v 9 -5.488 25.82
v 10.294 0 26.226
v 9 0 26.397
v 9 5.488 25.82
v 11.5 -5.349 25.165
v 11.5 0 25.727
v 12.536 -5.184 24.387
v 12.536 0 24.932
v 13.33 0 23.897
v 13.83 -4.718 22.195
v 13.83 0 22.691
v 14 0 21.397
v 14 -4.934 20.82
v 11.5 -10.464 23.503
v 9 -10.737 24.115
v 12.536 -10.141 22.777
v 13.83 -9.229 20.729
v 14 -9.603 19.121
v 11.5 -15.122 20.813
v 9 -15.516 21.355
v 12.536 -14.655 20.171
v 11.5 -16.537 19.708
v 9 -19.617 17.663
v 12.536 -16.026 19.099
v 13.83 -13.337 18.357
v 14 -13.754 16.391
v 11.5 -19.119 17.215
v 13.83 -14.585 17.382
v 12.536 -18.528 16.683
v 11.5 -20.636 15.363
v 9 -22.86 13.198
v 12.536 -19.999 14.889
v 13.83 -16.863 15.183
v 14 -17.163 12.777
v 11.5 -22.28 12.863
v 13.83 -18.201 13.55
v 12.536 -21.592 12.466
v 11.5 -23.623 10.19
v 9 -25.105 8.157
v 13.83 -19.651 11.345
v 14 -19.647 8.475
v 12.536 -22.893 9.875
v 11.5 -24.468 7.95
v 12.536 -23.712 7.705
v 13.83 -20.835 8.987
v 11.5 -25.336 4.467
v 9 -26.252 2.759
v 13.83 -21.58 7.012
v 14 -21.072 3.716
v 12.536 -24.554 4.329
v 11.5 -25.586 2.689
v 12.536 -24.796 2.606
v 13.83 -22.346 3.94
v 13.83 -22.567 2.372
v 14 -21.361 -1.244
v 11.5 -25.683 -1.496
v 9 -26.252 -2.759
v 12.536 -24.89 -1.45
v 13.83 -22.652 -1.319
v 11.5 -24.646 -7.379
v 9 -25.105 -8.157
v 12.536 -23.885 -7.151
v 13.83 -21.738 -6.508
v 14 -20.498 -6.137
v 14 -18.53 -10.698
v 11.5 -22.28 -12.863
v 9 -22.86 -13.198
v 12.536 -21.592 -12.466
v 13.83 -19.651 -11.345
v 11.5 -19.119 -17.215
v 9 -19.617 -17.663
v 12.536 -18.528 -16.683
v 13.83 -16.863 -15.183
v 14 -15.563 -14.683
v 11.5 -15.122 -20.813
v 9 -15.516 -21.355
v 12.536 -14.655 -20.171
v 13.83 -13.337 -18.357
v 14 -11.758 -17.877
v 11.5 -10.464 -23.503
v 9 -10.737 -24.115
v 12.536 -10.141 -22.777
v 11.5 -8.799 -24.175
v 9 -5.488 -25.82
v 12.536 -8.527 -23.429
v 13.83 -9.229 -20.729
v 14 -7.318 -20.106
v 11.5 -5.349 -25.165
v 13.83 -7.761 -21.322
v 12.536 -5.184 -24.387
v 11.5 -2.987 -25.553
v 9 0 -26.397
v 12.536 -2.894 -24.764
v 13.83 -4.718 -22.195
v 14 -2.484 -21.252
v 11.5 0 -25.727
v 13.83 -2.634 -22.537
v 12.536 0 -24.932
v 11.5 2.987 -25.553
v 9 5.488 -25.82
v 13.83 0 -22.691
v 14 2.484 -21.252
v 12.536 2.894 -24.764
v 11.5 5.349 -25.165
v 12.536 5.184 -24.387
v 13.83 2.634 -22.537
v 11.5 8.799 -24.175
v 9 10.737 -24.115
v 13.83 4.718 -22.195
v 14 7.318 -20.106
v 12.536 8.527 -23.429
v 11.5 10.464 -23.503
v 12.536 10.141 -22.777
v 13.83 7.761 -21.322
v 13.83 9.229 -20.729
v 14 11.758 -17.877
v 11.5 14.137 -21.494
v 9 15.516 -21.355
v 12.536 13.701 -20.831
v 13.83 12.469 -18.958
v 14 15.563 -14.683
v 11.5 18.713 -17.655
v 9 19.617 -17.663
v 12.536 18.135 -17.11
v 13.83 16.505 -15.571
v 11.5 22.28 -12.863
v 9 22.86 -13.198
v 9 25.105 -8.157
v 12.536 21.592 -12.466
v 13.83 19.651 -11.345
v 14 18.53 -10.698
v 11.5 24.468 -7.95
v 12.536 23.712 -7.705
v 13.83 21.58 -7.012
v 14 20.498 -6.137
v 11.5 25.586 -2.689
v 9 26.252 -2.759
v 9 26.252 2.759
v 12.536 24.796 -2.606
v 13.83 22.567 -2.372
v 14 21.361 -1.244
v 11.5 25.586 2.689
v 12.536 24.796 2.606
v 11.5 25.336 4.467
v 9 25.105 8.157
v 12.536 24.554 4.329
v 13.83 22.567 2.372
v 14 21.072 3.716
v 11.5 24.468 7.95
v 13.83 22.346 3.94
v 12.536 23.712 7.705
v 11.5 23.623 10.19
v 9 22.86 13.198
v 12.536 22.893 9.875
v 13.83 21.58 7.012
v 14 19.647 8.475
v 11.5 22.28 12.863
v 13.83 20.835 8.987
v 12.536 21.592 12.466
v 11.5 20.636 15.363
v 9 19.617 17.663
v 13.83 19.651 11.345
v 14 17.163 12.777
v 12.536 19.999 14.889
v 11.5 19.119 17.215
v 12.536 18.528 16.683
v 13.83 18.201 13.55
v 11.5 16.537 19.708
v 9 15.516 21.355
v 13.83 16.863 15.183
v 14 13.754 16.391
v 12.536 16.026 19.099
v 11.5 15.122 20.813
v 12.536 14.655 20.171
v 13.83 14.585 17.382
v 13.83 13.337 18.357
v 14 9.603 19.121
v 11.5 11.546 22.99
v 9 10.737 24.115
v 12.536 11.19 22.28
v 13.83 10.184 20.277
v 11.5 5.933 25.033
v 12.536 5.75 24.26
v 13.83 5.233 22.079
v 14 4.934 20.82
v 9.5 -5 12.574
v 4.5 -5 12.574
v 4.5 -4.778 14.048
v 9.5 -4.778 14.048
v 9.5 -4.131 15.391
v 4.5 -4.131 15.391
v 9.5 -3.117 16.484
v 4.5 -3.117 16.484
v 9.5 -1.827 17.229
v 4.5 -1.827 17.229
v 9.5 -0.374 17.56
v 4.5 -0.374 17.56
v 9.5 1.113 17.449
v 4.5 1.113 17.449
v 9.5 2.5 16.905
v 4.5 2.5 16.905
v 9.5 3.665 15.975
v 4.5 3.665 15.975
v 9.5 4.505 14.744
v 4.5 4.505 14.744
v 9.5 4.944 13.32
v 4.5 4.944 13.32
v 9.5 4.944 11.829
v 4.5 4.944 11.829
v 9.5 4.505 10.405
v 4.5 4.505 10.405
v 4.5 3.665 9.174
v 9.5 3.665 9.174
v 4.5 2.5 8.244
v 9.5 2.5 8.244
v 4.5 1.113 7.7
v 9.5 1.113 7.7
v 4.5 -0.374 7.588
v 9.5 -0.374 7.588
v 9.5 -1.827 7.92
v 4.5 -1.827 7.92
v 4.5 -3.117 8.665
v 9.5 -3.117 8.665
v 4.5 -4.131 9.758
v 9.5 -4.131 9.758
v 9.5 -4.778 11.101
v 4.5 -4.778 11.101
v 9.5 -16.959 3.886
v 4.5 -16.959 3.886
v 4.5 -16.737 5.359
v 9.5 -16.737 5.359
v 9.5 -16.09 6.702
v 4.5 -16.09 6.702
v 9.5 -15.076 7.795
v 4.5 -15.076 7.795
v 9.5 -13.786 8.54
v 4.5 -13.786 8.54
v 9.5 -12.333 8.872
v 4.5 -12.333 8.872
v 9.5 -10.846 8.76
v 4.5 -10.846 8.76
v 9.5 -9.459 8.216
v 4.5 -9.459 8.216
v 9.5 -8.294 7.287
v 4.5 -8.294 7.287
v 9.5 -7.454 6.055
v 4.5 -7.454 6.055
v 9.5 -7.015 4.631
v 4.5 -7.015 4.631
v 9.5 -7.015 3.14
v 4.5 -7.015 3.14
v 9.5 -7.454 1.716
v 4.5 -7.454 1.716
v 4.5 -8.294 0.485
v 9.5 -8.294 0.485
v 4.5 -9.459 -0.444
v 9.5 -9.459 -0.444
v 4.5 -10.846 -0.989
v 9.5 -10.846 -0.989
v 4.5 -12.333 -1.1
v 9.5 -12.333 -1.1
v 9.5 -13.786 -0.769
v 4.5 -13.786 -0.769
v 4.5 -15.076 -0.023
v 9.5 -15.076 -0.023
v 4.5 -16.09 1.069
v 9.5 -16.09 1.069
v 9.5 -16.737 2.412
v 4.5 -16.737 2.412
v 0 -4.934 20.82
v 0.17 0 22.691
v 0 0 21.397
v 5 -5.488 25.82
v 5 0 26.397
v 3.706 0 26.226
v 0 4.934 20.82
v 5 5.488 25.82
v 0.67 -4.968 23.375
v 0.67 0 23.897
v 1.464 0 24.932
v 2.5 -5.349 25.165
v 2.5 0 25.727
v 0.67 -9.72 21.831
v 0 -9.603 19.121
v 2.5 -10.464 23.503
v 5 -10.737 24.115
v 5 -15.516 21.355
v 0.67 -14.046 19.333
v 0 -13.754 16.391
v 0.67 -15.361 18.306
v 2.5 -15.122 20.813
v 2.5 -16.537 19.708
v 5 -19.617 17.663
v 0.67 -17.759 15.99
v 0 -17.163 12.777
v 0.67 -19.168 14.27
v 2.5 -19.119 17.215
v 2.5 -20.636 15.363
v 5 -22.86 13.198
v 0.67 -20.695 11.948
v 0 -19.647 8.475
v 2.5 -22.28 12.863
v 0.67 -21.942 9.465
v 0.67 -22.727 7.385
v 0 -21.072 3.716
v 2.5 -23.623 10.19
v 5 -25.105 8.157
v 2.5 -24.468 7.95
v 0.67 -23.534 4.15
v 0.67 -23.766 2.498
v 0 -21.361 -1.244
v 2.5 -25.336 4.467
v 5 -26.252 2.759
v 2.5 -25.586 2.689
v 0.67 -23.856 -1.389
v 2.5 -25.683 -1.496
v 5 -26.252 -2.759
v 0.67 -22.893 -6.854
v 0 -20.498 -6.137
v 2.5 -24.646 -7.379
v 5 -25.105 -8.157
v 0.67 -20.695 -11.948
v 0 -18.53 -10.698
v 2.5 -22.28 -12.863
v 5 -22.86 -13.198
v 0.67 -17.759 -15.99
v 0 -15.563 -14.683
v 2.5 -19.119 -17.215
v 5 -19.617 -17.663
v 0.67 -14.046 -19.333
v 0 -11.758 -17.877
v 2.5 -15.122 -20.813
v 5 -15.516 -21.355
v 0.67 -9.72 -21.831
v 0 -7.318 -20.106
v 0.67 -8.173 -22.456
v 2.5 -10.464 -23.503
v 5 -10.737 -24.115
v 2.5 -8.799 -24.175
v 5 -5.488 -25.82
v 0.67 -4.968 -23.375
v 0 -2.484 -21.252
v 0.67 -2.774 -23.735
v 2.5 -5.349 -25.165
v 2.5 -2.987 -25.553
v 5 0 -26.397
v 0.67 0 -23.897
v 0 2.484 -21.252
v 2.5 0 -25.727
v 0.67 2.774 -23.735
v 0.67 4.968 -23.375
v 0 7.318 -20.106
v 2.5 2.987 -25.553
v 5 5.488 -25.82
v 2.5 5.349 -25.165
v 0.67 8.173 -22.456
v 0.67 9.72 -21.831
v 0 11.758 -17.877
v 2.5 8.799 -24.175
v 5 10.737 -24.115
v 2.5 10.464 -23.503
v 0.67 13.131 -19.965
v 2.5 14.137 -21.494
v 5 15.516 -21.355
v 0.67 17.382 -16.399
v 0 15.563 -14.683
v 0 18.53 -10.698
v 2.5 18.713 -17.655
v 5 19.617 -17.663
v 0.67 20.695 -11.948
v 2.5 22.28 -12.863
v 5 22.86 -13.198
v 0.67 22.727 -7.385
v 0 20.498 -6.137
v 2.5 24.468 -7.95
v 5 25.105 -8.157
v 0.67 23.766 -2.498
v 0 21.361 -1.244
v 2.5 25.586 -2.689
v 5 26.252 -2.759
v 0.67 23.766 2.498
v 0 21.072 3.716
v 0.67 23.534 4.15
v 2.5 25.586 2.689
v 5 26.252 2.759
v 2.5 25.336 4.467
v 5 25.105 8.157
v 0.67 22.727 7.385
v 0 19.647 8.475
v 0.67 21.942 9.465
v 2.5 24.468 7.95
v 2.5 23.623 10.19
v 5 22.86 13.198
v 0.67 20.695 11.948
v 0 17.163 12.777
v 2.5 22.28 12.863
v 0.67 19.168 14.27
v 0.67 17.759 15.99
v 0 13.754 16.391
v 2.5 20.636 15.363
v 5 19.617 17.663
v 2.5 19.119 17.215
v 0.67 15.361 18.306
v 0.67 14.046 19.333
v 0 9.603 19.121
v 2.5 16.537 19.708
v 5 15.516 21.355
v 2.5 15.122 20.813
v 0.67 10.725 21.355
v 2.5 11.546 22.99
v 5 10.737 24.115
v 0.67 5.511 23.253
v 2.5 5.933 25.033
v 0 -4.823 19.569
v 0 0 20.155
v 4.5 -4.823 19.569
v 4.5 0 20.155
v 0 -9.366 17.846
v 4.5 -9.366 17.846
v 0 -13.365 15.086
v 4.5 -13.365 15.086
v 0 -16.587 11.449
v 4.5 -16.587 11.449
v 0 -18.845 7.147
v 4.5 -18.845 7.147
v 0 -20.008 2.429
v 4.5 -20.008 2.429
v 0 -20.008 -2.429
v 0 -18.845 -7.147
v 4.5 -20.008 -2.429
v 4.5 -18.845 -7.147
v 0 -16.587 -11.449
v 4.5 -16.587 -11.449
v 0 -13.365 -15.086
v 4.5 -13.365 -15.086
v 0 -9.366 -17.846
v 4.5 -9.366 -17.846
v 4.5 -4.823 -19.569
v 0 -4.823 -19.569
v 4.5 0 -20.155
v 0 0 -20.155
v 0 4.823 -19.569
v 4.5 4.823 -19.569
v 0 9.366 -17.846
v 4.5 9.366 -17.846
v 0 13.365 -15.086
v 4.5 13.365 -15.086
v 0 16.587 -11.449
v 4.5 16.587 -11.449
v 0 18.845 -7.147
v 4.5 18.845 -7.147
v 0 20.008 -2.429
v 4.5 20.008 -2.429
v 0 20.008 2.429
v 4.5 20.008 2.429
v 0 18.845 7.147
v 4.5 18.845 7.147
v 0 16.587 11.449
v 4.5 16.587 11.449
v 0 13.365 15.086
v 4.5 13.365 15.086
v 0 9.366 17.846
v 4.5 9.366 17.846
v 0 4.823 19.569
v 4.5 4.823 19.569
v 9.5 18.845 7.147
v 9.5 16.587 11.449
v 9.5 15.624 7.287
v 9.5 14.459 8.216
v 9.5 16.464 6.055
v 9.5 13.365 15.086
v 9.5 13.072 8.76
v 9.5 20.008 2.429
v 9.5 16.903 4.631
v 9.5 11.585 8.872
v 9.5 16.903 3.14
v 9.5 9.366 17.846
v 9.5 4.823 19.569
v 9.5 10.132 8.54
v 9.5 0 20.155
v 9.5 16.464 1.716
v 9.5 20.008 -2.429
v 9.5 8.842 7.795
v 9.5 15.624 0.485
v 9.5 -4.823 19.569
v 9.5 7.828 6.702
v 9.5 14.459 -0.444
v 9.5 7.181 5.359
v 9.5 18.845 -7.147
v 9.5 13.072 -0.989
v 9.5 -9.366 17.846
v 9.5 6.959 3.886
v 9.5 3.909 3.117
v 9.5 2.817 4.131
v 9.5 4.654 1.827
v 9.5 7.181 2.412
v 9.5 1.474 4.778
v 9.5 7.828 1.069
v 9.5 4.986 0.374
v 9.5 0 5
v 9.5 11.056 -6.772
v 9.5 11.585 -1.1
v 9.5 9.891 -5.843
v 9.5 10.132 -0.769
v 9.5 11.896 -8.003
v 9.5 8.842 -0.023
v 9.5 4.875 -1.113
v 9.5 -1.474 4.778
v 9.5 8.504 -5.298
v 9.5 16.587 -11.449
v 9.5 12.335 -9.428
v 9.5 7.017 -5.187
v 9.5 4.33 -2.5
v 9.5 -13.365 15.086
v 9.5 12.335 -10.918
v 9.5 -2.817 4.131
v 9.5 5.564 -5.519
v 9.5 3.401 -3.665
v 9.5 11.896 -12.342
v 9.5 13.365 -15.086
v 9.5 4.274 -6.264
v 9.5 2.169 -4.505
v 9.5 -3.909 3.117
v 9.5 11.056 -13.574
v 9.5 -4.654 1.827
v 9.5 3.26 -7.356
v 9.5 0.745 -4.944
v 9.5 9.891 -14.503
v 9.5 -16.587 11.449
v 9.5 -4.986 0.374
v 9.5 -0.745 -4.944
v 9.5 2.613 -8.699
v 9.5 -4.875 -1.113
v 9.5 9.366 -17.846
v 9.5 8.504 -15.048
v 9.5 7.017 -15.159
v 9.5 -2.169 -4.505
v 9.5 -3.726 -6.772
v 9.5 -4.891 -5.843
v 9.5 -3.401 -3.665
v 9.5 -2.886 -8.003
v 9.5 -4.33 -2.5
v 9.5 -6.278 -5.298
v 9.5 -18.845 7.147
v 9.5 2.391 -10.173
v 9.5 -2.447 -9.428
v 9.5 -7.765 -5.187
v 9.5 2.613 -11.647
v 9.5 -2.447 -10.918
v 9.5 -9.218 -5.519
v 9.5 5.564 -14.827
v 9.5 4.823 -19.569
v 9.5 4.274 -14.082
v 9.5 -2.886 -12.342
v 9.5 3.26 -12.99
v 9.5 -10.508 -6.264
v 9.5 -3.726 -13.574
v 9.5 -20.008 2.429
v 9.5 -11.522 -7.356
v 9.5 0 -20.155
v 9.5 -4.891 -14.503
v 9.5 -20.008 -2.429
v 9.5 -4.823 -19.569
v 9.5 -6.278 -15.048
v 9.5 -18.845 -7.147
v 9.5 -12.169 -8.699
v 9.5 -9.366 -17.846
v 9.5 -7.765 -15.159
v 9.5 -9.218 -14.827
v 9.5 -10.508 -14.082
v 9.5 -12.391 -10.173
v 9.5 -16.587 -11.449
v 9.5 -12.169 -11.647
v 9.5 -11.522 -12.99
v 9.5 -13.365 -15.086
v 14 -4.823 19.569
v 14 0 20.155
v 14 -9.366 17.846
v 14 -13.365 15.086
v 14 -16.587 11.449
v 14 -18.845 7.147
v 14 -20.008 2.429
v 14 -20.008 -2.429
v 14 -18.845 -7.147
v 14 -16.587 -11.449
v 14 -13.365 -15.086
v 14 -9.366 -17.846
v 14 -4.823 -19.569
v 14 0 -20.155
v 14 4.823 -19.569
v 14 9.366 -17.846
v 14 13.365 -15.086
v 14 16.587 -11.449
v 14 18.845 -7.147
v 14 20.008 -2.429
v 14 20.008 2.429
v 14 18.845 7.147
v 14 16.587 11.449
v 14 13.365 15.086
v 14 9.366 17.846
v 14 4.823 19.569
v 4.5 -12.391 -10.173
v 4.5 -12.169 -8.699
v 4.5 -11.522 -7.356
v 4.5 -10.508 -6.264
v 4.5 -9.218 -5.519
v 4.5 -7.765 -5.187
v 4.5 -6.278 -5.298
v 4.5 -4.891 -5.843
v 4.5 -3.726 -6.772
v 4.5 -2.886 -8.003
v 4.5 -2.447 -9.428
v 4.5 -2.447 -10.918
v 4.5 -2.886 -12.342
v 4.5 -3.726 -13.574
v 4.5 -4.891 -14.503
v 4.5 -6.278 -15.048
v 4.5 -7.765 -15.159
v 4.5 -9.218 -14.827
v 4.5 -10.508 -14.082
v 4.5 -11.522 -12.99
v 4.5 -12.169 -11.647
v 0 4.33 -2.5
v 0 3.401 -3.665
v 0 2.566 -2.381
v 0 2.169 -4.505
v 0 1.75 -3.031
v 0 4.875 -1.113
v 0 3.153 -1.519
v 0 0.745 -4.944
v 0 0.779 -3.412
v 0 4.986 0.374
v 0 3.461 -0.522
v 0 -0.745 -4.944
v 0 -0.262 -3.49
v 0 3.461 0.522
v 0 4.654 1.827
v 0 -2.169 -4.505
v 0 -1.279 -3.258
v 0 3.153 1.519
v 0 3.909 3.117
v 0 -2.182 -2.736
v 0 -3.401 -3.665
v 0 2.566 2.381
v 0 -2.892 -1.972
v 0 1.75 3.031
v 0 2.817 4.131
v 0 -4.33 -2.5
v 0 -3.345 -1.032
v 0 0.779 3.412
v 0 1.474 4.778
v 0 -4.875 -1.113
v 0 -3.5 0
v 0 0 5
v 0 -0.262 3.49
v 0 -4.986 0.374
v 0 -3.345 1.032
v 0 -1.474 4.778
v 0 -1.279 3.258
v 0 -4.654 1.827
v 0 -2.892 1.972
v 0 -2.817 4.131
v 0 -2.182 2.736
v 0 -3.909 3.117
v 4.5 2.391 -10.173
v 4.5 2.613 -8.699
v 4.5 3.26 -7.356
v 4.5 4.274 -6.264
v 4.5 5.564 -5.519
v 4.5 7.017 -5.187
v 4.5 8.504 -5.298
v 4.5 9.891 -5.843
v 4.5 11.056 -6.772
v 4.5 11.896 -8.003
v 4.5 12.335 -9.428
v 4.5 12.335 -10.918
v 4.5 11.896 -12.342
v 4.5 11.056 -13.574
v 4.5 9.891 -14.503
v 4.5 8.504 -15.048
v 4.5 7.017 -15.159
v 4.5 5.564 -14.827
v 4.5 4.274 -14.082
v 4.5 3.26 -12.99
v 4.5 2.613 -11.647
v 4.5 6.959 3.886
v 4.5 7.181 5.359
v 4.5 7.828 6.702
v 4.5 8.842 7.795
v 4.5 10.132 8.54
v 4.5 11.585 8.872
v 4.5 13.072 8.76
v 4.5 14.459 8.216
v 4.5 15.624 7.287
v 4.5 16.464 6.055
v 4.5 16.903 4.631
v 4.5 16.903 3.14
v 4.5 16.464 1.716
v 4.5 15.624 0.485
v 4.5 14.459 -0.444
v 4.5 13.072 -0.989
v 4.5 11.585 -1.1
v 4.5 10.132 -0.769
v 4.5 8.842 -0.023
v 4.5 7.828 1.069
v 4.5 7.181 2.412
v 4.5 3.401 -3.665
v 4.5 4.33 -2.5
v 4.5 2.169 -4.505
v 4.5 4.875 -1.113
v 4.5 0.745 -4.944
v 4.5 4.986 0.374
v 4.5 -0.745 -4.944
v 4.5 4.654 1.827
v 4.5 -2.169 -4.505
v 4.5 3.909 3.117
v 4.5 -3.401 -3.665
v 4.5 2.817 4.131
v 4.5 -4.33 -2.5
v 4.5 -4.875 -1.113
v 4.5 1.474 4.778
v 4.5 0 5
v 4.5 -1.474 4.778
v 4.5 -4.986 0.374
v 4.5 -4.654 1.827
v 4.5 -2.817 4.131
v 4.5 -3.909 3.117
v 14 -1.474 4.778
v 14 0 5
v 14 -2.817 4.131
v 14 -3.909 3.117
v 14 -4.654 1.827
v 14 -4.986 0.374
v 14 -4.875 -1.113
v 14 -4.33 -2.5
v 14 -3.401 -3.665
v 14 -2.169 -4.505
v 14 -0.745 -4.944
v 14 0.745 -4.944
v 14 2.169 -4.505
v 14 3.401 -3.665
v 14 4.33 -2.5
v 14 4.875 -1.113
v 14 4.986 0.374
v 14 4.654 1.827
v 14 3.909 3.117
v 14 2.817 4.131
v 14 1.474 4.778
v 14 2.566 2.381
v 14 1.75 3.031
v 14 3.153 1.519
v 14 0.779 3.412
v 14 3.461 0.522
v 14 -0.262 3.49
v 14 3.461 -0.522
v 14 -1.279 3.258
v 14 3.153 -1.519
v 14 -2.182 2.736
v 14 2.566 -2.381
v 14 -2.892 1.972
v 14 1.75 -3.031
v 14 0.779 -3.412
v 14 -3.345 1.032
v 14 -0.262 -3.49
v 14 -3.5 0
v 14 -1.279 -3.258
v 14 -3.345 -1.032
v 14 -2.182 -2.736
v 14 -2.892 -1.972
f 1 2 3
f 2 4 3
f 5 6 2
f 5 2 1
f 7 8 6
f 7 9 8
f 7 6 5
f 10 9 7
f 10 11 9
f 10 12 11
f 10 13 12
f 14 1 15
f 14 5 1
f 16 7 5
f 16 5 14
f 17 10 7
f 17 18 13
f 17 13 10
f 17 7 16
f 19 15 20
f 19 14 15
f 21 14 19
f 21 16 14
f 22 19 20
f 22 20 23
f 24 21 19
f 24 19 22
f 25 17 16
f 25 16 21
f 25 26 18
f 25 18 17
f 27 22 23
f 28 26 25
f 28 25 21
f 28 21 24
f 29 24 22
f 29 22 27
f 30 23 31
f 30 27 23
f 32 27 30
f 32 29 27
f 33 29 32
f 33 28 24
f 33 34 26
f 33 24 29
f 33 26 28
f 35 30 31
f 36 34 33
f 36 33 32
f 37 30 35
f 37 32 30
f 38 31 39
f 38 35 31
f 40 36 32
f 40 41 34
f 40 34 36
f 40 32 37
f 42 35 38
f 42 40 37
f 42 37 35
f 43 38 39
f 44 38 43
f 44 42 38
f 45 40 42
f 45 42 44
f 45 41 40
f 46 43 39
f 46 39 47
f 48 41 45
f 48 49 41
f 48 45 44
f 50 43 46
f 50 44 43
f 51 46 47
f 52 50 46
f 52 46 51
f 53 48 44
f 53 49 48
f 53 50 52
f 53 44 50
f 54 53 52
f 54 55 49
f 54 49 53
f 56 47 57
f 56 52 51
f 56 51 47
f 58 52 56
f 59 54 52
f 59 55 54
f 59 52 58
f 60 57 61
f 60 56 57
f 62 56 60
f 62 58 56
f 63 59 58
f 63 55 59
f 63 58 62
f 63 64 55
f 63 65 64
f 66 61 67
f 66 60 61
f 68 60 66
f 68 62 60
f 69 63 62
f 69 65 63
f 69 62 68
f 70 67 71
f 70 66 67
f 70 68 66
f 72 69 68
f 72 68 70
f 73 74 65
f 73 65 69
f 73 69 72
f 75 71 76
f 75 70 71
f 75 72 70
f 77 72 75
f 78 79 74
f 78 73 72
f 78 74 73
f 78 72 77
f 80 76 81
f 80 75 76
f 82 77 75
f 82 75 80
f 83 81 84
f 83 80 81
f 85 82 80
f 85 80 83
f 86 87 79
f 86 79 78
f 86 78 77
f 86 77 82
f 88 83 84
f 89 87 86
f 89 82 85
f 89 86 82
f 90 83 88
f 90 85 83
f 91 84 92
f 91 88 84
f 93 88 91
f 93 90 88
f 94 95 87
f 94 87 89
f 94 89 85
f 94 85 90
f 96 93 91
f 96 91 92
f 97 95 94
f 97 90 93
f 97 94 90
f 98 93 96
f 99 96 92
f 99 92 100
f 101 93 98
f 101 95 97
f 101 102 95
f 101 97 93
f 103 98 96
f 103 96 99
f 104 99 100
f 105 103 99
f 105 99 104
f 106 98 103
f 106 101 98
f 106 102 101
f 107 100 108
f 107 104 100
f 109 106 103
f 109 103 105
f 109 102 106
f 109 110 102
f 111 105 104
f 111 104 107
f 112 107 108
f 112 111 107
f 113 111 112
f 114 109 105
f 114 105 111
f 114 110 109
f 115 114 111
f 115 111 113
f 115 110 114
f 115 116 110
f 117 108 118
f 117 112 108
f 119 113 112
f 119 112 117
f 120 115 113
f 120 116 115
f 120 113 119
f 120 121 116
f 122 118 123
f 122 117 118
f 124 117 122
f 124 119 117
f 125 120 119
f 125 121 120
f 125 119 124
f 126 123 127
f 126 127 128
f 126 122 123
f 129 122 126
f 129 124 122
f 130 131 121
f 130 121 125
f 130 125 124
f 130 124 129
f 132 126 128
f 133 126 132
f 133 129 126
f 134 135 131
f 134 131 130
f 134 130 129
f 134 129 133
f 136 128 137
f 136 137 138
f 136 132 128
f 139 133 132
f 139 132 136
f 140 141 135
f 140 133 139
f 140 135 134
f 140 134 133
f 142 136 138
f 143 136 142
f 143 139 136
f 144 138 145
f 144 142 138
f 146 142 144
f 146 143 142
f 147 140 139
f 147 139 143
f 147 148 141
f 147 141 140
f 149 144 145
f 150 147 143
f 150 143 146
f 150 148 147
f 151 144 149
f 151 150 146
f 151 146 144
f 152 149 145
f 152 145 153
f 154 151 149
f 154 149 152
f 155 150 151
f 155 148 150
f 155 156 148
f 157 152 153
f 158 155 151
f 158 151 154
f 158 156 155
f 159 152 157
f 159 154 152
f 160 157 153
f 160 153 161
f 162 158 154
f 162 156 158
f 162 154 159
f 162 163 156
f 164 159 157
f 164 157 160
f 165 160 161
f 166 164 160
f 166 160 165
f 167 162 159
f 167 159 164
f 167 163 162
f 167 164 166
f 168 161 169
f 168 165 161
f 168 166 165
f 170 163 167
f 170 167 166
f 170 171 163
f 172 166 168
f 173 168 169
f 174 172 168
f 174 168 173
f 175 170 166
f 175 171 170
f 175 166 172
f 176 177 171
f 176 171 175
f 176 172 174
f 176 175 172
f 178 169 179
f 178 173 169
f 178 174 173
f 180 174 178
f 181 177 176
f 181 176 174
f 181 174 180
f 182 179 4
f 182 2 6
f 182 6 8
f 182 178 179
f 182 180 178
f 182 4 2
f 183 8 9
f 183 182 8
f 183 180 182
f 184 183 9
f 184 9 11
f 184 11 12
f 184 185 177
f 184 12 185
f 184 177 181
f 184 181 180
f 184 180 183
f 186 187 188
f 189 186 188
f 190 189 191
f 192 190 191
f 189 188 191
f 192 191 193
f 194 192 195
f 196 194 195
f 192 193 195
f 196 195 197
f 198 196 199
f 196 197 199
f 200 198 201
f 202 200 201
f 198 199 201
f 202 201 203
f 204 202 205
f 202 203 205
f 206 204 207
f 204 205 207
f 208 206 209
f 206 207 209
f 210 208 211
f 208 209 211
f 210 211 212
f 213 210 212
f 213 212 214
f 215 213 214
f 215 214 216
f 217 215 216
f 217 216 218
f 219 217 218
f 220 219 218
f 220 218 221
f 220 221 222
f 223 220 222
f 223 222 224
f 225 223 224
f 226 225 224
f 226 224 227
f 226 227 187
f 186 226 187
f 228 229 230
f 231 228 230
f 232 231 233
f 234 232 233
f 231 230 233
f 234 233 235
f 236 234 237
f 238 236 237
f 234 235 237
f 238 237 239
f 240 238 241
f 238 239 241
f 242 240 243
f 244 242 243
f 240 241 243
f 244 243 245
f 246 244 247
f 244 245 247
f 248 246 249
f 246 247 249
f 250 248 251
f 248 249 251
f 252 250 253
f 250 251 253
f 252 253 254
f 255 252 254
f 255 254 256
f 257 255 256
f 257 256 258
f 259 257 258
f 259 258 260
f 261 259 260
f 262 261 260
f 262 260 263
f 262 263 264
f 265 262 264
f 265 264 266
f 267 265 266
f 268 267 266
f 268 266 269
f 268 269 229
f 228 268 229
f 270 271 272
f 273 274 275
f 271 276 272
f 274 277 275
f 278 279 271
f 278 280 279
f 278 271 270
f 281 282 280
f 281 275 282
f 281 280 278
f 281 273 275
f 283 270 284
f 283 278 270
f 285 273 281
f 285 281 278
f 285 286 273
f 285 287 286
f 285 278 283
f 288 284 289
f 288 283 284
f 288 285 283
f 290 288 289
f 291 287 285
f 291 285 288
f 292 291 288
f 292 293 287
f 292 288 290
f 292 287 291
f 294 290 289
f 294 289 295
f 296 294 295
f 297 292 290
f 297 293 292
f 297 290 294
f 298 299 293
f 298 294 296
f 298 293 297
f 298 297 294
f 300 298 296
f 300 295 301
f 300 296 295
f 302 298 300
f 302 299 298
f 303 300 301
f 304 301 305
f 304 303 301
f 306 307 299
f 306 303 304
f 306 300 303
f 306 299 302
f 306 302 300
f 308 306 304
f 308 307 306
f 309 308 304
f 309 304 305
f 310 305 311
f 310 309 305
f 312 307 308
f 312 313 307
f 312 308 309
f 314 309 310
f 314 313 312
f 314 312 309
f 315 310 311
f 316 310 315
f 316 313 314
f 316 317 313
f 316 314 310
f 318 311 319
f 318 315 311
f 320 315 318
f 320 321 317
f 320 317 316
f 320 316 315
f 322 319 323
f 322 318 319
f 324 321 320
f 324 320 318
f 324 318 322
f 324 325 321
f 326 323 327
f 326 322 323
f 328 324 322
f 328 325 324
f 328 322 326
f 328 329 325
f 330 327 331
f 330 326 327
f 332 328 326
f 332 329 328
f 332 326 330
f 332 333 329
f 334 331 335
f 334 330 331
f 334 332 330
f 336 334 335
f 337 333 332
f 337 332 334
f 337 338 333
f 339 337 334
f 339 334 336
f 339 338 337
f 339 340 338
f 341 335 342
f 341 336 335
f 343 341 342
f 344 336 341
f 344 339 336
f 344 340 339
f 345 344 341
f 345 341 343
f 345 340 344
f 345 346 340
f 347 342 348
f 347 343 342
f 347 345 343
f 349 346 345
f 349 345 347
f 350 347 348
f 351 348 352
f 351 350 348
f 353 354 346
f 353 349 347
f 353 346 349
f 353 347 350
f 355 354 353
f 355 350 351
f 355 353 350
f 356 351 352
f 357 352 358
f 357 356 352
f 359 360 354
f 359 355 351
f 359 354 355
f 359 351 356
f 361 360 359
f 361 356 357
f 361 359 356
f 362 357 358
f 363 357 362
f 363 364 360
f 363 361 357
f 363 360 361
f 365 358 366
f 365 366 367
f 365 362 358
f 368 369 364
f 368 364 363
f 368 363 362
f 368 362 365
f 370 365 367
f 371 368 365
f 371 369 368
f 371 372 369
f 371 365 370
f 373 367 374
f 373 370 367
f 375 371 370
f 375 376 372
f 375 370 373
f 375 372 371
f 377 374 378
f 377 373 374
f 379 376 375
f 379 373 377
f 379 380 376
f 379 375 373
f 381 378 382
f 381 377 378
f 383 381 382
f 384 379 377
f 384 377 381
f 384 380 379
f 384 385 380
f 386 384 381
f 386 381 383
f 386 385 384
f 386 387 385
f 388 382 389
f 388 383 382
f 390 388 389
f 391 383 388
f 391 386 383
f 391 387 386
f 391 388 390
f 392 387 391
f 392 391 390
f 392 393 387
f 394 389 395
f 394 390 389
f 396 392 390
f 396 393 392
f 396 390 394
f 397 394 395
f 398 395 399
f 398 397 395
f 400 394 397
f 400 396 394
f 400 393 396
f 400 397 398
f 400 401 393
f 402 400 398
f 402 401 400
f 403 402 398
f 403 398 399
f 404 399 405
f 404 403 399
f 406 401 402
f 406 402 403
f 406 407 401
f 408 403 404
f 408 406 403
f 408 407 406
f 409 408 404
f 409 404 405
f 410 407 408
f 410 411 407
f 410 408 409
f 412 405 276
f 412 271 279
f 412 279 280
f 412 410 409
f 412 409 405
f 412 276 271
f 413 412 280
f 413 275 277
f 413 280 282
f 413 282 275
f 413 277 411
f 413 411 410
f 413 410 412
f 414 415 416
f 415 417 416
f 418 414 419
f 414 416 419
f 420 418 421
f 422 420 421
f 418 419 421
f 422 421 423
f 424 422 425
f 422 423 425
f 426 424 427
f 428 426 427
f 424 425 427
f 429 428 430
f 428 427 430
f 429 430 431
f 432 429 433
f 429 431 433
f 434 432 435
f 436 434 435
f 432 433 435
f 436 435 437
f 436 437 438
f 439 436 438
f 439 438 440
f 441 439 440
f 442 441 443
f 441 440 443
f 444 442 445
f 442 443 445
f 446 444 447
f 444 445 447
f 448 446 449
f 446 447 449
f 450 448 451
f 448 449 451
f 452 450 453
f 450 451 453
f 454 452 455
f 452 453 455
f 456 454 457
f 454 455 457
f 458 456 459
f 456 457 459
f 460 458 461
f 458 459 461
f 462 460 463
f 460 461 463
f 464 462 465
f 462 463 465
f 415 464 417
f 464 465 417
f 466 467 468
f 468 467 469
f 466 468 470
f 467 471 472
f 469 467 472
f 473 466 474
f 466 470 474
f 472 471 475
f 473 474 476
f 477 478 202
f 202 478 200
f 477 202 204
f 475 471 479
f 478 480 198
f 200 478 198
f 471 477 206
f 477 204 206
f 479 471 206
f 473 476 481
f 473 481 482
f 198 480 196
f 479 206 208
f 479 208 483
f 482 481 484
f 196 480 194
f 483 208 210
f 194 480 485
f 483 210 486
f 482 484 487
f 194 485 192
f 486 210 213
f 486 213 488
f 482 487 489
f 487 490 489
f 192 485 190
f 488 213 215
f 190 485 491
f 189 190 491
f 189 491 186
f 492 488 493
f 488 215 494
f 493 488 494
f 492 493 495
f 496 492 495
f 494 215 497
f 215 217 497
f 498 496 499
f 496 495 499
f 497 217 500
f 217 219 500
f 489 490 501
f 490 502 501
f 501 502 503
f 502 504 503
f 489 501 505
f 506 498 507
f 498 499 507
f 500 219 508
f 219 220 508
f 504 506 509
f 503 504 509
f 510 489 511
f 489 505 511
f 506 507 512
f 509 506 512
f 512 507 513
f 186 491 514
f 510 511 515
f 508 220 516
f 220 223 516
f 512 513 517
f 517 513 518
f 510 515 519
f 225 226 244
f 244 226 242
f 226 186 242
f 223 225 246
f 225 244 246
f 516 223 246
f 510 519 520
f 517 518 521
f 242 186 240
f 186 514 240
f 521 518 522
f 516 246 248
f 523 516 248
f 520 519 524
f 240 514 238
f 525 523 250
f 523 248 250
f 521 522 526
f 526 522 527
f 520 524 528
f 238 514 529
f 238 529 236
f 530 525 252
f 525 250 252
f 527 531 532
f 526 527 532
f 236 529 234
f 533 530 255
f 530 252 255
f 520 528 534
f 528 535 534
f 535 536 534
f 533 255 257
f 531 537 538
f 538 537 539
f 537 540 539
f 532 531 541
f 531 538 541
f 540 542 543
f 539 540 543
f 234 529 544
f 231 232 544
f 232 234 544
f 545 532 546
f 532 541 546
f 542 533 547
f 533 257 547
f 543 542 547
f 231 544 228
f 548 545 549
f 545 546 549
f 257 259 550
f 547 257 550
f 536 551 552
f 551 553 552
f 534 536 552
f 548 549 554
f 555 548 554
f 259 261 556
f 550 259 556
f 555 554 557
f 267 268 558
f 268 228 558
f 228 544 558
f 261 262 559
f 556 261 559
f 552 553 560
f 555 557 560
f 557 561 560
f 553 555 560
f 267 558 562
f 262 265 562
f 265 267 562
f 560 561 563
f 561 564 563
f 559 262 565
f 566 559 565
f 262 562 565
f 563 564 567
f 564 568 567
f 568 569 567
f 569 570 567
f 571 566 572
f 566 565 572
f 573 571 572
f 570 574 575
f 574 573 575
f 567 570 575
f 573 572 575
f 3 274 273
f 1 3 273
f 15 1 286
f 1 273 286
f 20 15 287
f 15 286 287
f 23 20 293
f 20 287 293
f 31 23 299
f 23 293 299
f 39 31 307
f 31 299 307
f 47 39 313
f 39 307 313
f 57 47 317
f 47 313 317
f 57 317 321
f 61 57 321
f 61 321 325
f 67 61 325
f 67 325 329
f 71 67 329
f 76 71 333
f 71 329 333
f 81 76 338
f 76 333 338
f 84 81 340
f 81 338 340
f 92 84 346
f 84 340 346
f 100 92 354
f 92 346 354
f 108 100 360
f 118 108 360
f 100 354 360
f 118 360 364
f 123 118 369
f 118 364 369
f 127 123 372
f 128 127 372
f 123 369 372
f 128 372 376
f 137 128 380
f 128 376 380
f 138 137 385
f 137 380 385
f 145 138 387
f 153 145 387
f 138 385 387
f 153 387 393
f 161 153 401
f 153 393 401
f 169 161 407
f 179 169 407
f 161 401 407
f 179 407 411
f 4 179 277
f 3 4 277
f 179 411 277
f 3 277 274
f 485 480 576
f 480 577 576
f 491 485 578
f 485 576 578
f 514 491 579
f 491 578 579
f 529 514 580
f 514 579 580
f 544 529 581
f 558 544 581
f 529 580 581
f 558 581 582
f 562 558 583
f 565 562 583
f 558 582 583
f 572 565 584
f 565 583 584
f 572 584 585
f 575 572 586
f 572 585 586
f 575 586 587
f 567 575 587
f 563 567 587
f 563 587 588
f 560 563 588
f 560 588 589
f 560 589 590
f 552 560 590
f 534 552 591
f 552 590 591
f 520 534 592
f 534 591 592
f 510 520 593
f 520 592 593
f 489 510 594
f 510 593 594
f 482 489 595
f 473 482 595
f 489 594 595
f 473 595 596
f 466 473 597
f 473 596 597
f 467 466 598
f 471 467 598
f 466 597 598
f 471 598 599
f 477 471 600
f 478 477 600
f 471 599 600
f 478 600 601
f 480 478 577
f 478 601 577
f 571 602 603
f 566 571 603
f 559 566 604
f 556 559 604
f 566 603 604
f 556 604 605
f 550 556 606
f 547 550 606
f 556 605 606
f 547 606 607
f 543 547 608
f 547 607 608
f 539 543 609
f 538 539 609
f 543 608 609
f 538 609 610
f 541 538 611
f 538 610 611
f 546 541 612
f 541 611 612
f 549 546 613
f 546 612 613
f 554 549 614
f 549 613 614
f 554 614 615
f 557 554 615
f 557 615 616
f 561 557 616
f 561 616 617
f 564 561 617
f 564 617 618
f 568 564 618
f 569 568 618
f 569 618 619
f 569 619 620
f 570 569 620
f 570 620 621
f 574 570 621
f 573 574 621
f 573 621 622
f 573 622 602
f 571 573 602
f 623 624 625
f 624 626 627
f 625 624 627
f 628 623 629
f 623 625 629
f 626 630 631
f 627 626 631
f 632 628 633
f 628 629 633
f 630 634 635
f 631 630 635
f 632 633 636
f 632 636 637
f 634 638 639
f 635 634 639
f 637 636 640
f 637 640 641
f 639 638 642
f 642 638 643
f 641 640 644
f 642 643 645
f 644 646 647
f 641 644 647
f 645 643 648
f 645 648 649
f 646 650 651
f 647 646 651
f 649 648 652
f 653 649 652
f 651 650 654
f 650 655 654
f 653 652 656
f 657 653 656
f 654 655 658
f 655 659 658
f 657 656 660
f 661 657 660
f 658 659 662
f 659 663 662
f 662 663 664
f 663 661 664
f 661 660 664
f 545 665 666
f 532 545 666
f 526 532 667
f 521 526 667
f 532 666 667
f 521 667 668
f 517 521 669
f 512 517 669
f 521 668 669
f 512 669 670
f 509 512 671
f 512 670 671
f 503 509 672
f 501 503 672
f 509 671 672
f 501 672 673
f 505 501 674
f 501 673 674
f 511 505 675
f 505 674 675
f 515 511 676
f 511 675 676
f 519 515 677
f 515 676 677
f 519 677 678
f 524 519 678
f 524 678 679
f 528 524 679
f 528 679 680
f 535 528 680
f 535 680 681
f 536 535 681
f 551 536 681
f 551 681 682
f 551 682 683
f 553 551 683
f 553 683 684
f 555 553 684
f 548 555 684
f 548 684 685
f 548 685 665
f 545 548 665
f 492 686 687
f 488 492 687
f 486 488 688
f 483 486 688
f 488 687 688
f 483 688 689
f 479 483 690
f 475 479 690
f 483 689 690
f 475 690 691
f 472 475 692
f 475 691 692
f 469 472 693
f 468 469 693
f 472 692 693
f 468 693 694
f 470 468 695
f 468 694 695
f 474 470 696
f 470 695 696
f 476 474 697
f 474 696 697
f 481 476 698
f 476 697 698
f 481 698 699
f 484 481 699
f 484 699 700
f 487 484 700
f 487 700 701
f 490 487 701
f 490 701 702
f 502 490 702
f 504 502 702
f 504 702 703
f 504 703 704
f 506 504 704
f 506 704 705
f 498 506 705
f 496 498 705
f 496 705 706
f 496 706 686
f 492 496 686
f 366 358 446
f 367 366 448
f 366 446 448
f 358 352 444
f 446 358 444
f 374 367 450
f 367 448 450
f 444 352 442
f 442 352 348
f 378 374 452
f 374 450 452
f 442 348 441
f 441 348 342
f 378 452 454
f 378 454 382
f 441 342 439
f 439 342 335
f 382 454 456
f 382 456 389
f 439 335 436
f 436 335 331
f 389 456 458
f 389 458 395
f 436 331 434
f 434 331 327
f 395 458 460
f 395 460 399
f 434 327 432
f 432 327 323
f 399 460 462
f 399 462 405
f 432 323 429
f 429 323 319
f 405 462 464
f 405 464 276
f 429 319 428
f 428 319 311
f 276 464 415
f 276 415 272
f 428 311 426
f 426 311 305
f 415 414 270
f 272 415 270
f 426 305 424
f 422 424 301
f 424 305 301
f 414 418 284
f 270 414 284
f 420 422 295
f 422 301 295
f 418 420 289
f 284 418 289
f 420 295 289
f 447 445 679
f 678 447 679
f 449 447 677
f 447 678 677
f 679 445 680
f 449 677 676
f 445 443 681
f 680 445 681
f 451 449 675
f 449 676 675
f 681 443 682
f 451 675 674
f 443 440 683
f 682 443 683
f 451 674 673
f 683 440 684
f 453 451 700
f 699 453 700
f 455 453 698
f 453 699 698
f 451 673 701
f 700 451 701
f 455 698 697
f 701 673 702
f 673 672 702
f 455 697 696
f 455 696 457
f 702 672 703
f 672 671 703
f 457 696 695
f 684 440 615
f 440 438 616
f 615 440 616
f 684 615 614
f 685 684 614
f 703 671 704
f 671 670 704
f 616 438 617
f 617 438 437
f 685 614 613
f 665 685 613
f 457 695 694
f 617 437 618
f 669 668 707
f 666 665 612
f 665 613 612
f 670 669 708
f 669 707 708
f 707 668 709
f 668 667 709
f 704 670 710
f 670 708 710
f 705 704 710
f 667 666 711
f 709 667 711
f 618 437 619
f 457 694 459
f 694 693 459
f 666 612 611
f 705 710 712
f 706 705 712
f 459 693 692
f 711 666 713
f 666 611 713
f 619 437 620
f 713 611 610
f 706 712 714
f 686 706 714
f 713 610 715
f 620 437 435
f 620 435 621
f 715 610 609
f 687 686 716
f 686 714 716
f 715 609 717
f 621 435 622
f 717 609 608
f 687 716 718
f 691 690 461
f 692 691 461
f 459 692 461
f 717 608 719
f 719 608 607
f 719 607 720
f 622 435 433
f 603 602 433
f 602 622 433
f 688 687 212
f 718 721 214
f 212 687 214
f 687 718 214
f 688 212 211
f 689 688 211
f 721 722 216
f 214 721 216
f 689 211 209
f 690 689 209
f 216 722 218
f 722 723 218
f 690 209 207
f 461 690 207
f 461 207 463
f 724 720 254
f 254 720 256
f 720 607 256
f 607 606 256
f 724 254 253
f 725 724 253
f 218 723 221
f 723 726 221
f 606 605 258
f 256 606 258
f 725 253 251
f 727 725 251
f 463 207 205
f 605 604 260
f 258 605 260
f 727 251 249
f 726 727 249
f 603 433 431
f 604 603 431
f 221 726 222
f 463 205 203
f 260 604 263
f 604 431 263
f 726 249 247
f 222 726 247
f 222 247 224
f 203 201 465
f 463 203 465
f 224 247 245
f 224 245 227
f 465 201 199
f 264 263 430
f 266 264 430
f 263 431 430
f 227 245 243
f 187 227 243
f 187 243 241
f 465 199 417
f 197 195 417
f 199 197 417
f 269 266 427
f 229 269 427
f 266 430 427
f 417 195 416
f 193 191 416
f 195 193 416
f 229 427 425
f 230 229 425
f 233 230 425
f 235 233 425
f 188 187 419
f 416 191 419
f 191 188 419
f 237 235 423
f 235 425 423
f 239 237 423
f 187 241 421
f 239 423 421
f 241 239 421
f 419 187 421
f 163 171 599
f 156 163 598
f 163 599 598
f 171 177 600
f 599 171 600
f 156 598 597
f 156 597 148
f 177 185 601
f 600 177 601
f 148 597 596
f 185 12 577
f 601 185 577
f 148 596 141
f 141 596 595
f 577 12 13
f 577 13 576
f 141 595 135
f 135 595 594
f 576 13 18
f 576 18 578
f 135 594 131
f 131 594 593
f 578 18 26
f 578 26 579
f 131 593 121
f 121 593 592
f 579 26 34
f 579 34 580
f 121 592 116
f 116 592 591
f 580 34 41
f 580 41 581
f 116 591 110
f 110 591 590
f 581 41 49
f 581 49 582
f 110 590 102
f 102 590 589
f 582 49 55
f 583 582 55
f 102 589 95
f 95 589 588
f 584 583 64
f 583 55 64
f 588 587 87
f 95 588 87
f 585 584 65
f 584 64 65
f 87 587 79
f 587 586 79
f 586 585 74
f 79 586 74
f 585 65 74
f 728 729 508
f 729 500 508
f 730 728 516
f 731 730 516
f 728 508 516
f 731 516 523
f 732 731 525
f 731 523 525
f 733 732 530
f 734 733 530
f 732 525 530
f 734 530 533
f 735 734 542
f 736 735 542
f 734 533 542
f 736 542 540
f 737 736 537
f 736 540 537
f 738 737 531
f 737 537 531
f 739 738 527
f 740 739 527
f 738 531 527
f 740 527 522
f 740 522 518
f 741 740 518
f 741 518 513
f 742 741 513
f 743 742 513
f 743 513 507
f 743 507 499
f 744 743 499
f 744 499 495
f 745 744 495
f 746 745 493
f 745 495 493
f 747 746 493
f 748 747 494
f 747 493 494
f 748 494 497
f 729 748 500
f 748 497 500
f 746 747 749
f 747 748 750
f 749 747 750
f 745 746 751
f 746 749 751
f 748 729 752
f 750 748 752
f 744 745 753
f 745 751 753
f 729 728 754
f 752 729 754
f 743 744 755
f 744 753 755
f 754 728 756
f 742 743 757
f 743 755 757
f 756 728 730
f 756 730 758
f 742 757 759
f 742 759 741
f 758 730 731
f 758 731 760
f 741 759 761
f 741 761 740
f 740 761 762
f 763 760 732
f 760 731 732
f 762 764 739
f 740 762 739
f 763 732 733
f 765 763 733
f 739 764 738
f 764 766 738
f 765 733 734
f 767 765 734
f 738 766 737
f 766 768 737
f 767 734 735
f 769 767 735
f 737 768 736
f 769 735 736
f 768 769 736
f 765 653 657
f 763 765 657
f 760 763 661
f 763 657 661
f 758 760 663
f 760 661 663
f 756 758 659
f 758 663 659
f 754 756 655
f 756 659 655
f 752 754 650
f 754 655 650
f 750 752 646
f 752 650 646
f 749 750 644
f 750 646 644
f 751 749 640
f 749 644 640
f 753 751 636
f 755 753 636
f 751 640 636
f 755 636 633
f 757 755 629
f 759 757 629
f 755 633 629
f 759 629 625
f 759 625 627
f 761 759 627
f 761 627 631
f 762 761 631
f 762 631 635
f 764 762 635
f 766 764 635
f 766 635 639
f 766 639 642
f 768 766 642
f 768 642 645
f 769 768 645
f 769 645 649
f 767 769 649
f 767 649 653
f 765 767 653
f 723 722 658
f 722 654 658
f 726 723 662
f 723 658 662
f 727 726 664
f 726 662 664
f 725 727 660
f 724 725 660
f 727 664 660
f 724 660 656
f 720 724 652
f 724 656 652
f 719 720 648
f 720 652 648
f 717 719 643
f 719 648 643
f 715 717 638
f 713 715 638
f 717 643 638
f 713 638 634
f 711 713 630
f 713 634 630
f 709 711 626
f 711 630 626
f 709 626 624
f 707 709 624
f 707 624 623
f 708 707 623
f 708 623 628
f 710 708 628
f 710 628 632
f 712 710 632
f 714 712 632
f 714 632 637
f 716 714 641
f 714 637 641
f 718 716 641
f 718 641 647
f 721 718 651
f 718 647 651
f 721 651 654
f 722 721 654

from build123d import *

# Parameters (mm, degrees)
F3_D = 10
F4_R = 5
F6_D = 7


with BuildPart() as f1:
    # F0 (on Front) → F1 (revolve)
    with BuildSketch(Plane.XZ):
        Polygon((0, 5), (0, 0), (14, 0), (14, 5), (9.5, 5), (9.5, 20.154822), (14, 20.154822), (14, 26.396757), (0, 26.396757), (0, 20.154822), (4.5, 20.154822), (4.5, 5), align=None)
    revolve(axis=Axis((7, 0, 0), (1, 0, 0)))

    # F3 (through all)
    with Locations(Plane.YZ.offset(9.5)):
        with Locations((0, 12.574399), (-11.958964, 3.885703), (-7.391046, -10.172902), (7.391046, -10.172902), (11.958964, 3.885703)):
            Hole(F3_D / 2)

    # F4
    f4_edges = [f1.edges().sort_by_distance(p)[0] for p in [
        (14, 0, -26.396757),
        (0, 0, -26.396757),
    ]]
    fillet(f4_edges, radius=F4_R)

    # F6 (through all)
    with Locations(Plane.YZ.offset(14)):
        with Locations((0, 0)):
            Hole(F6_D / 2)


solid = f1.part
